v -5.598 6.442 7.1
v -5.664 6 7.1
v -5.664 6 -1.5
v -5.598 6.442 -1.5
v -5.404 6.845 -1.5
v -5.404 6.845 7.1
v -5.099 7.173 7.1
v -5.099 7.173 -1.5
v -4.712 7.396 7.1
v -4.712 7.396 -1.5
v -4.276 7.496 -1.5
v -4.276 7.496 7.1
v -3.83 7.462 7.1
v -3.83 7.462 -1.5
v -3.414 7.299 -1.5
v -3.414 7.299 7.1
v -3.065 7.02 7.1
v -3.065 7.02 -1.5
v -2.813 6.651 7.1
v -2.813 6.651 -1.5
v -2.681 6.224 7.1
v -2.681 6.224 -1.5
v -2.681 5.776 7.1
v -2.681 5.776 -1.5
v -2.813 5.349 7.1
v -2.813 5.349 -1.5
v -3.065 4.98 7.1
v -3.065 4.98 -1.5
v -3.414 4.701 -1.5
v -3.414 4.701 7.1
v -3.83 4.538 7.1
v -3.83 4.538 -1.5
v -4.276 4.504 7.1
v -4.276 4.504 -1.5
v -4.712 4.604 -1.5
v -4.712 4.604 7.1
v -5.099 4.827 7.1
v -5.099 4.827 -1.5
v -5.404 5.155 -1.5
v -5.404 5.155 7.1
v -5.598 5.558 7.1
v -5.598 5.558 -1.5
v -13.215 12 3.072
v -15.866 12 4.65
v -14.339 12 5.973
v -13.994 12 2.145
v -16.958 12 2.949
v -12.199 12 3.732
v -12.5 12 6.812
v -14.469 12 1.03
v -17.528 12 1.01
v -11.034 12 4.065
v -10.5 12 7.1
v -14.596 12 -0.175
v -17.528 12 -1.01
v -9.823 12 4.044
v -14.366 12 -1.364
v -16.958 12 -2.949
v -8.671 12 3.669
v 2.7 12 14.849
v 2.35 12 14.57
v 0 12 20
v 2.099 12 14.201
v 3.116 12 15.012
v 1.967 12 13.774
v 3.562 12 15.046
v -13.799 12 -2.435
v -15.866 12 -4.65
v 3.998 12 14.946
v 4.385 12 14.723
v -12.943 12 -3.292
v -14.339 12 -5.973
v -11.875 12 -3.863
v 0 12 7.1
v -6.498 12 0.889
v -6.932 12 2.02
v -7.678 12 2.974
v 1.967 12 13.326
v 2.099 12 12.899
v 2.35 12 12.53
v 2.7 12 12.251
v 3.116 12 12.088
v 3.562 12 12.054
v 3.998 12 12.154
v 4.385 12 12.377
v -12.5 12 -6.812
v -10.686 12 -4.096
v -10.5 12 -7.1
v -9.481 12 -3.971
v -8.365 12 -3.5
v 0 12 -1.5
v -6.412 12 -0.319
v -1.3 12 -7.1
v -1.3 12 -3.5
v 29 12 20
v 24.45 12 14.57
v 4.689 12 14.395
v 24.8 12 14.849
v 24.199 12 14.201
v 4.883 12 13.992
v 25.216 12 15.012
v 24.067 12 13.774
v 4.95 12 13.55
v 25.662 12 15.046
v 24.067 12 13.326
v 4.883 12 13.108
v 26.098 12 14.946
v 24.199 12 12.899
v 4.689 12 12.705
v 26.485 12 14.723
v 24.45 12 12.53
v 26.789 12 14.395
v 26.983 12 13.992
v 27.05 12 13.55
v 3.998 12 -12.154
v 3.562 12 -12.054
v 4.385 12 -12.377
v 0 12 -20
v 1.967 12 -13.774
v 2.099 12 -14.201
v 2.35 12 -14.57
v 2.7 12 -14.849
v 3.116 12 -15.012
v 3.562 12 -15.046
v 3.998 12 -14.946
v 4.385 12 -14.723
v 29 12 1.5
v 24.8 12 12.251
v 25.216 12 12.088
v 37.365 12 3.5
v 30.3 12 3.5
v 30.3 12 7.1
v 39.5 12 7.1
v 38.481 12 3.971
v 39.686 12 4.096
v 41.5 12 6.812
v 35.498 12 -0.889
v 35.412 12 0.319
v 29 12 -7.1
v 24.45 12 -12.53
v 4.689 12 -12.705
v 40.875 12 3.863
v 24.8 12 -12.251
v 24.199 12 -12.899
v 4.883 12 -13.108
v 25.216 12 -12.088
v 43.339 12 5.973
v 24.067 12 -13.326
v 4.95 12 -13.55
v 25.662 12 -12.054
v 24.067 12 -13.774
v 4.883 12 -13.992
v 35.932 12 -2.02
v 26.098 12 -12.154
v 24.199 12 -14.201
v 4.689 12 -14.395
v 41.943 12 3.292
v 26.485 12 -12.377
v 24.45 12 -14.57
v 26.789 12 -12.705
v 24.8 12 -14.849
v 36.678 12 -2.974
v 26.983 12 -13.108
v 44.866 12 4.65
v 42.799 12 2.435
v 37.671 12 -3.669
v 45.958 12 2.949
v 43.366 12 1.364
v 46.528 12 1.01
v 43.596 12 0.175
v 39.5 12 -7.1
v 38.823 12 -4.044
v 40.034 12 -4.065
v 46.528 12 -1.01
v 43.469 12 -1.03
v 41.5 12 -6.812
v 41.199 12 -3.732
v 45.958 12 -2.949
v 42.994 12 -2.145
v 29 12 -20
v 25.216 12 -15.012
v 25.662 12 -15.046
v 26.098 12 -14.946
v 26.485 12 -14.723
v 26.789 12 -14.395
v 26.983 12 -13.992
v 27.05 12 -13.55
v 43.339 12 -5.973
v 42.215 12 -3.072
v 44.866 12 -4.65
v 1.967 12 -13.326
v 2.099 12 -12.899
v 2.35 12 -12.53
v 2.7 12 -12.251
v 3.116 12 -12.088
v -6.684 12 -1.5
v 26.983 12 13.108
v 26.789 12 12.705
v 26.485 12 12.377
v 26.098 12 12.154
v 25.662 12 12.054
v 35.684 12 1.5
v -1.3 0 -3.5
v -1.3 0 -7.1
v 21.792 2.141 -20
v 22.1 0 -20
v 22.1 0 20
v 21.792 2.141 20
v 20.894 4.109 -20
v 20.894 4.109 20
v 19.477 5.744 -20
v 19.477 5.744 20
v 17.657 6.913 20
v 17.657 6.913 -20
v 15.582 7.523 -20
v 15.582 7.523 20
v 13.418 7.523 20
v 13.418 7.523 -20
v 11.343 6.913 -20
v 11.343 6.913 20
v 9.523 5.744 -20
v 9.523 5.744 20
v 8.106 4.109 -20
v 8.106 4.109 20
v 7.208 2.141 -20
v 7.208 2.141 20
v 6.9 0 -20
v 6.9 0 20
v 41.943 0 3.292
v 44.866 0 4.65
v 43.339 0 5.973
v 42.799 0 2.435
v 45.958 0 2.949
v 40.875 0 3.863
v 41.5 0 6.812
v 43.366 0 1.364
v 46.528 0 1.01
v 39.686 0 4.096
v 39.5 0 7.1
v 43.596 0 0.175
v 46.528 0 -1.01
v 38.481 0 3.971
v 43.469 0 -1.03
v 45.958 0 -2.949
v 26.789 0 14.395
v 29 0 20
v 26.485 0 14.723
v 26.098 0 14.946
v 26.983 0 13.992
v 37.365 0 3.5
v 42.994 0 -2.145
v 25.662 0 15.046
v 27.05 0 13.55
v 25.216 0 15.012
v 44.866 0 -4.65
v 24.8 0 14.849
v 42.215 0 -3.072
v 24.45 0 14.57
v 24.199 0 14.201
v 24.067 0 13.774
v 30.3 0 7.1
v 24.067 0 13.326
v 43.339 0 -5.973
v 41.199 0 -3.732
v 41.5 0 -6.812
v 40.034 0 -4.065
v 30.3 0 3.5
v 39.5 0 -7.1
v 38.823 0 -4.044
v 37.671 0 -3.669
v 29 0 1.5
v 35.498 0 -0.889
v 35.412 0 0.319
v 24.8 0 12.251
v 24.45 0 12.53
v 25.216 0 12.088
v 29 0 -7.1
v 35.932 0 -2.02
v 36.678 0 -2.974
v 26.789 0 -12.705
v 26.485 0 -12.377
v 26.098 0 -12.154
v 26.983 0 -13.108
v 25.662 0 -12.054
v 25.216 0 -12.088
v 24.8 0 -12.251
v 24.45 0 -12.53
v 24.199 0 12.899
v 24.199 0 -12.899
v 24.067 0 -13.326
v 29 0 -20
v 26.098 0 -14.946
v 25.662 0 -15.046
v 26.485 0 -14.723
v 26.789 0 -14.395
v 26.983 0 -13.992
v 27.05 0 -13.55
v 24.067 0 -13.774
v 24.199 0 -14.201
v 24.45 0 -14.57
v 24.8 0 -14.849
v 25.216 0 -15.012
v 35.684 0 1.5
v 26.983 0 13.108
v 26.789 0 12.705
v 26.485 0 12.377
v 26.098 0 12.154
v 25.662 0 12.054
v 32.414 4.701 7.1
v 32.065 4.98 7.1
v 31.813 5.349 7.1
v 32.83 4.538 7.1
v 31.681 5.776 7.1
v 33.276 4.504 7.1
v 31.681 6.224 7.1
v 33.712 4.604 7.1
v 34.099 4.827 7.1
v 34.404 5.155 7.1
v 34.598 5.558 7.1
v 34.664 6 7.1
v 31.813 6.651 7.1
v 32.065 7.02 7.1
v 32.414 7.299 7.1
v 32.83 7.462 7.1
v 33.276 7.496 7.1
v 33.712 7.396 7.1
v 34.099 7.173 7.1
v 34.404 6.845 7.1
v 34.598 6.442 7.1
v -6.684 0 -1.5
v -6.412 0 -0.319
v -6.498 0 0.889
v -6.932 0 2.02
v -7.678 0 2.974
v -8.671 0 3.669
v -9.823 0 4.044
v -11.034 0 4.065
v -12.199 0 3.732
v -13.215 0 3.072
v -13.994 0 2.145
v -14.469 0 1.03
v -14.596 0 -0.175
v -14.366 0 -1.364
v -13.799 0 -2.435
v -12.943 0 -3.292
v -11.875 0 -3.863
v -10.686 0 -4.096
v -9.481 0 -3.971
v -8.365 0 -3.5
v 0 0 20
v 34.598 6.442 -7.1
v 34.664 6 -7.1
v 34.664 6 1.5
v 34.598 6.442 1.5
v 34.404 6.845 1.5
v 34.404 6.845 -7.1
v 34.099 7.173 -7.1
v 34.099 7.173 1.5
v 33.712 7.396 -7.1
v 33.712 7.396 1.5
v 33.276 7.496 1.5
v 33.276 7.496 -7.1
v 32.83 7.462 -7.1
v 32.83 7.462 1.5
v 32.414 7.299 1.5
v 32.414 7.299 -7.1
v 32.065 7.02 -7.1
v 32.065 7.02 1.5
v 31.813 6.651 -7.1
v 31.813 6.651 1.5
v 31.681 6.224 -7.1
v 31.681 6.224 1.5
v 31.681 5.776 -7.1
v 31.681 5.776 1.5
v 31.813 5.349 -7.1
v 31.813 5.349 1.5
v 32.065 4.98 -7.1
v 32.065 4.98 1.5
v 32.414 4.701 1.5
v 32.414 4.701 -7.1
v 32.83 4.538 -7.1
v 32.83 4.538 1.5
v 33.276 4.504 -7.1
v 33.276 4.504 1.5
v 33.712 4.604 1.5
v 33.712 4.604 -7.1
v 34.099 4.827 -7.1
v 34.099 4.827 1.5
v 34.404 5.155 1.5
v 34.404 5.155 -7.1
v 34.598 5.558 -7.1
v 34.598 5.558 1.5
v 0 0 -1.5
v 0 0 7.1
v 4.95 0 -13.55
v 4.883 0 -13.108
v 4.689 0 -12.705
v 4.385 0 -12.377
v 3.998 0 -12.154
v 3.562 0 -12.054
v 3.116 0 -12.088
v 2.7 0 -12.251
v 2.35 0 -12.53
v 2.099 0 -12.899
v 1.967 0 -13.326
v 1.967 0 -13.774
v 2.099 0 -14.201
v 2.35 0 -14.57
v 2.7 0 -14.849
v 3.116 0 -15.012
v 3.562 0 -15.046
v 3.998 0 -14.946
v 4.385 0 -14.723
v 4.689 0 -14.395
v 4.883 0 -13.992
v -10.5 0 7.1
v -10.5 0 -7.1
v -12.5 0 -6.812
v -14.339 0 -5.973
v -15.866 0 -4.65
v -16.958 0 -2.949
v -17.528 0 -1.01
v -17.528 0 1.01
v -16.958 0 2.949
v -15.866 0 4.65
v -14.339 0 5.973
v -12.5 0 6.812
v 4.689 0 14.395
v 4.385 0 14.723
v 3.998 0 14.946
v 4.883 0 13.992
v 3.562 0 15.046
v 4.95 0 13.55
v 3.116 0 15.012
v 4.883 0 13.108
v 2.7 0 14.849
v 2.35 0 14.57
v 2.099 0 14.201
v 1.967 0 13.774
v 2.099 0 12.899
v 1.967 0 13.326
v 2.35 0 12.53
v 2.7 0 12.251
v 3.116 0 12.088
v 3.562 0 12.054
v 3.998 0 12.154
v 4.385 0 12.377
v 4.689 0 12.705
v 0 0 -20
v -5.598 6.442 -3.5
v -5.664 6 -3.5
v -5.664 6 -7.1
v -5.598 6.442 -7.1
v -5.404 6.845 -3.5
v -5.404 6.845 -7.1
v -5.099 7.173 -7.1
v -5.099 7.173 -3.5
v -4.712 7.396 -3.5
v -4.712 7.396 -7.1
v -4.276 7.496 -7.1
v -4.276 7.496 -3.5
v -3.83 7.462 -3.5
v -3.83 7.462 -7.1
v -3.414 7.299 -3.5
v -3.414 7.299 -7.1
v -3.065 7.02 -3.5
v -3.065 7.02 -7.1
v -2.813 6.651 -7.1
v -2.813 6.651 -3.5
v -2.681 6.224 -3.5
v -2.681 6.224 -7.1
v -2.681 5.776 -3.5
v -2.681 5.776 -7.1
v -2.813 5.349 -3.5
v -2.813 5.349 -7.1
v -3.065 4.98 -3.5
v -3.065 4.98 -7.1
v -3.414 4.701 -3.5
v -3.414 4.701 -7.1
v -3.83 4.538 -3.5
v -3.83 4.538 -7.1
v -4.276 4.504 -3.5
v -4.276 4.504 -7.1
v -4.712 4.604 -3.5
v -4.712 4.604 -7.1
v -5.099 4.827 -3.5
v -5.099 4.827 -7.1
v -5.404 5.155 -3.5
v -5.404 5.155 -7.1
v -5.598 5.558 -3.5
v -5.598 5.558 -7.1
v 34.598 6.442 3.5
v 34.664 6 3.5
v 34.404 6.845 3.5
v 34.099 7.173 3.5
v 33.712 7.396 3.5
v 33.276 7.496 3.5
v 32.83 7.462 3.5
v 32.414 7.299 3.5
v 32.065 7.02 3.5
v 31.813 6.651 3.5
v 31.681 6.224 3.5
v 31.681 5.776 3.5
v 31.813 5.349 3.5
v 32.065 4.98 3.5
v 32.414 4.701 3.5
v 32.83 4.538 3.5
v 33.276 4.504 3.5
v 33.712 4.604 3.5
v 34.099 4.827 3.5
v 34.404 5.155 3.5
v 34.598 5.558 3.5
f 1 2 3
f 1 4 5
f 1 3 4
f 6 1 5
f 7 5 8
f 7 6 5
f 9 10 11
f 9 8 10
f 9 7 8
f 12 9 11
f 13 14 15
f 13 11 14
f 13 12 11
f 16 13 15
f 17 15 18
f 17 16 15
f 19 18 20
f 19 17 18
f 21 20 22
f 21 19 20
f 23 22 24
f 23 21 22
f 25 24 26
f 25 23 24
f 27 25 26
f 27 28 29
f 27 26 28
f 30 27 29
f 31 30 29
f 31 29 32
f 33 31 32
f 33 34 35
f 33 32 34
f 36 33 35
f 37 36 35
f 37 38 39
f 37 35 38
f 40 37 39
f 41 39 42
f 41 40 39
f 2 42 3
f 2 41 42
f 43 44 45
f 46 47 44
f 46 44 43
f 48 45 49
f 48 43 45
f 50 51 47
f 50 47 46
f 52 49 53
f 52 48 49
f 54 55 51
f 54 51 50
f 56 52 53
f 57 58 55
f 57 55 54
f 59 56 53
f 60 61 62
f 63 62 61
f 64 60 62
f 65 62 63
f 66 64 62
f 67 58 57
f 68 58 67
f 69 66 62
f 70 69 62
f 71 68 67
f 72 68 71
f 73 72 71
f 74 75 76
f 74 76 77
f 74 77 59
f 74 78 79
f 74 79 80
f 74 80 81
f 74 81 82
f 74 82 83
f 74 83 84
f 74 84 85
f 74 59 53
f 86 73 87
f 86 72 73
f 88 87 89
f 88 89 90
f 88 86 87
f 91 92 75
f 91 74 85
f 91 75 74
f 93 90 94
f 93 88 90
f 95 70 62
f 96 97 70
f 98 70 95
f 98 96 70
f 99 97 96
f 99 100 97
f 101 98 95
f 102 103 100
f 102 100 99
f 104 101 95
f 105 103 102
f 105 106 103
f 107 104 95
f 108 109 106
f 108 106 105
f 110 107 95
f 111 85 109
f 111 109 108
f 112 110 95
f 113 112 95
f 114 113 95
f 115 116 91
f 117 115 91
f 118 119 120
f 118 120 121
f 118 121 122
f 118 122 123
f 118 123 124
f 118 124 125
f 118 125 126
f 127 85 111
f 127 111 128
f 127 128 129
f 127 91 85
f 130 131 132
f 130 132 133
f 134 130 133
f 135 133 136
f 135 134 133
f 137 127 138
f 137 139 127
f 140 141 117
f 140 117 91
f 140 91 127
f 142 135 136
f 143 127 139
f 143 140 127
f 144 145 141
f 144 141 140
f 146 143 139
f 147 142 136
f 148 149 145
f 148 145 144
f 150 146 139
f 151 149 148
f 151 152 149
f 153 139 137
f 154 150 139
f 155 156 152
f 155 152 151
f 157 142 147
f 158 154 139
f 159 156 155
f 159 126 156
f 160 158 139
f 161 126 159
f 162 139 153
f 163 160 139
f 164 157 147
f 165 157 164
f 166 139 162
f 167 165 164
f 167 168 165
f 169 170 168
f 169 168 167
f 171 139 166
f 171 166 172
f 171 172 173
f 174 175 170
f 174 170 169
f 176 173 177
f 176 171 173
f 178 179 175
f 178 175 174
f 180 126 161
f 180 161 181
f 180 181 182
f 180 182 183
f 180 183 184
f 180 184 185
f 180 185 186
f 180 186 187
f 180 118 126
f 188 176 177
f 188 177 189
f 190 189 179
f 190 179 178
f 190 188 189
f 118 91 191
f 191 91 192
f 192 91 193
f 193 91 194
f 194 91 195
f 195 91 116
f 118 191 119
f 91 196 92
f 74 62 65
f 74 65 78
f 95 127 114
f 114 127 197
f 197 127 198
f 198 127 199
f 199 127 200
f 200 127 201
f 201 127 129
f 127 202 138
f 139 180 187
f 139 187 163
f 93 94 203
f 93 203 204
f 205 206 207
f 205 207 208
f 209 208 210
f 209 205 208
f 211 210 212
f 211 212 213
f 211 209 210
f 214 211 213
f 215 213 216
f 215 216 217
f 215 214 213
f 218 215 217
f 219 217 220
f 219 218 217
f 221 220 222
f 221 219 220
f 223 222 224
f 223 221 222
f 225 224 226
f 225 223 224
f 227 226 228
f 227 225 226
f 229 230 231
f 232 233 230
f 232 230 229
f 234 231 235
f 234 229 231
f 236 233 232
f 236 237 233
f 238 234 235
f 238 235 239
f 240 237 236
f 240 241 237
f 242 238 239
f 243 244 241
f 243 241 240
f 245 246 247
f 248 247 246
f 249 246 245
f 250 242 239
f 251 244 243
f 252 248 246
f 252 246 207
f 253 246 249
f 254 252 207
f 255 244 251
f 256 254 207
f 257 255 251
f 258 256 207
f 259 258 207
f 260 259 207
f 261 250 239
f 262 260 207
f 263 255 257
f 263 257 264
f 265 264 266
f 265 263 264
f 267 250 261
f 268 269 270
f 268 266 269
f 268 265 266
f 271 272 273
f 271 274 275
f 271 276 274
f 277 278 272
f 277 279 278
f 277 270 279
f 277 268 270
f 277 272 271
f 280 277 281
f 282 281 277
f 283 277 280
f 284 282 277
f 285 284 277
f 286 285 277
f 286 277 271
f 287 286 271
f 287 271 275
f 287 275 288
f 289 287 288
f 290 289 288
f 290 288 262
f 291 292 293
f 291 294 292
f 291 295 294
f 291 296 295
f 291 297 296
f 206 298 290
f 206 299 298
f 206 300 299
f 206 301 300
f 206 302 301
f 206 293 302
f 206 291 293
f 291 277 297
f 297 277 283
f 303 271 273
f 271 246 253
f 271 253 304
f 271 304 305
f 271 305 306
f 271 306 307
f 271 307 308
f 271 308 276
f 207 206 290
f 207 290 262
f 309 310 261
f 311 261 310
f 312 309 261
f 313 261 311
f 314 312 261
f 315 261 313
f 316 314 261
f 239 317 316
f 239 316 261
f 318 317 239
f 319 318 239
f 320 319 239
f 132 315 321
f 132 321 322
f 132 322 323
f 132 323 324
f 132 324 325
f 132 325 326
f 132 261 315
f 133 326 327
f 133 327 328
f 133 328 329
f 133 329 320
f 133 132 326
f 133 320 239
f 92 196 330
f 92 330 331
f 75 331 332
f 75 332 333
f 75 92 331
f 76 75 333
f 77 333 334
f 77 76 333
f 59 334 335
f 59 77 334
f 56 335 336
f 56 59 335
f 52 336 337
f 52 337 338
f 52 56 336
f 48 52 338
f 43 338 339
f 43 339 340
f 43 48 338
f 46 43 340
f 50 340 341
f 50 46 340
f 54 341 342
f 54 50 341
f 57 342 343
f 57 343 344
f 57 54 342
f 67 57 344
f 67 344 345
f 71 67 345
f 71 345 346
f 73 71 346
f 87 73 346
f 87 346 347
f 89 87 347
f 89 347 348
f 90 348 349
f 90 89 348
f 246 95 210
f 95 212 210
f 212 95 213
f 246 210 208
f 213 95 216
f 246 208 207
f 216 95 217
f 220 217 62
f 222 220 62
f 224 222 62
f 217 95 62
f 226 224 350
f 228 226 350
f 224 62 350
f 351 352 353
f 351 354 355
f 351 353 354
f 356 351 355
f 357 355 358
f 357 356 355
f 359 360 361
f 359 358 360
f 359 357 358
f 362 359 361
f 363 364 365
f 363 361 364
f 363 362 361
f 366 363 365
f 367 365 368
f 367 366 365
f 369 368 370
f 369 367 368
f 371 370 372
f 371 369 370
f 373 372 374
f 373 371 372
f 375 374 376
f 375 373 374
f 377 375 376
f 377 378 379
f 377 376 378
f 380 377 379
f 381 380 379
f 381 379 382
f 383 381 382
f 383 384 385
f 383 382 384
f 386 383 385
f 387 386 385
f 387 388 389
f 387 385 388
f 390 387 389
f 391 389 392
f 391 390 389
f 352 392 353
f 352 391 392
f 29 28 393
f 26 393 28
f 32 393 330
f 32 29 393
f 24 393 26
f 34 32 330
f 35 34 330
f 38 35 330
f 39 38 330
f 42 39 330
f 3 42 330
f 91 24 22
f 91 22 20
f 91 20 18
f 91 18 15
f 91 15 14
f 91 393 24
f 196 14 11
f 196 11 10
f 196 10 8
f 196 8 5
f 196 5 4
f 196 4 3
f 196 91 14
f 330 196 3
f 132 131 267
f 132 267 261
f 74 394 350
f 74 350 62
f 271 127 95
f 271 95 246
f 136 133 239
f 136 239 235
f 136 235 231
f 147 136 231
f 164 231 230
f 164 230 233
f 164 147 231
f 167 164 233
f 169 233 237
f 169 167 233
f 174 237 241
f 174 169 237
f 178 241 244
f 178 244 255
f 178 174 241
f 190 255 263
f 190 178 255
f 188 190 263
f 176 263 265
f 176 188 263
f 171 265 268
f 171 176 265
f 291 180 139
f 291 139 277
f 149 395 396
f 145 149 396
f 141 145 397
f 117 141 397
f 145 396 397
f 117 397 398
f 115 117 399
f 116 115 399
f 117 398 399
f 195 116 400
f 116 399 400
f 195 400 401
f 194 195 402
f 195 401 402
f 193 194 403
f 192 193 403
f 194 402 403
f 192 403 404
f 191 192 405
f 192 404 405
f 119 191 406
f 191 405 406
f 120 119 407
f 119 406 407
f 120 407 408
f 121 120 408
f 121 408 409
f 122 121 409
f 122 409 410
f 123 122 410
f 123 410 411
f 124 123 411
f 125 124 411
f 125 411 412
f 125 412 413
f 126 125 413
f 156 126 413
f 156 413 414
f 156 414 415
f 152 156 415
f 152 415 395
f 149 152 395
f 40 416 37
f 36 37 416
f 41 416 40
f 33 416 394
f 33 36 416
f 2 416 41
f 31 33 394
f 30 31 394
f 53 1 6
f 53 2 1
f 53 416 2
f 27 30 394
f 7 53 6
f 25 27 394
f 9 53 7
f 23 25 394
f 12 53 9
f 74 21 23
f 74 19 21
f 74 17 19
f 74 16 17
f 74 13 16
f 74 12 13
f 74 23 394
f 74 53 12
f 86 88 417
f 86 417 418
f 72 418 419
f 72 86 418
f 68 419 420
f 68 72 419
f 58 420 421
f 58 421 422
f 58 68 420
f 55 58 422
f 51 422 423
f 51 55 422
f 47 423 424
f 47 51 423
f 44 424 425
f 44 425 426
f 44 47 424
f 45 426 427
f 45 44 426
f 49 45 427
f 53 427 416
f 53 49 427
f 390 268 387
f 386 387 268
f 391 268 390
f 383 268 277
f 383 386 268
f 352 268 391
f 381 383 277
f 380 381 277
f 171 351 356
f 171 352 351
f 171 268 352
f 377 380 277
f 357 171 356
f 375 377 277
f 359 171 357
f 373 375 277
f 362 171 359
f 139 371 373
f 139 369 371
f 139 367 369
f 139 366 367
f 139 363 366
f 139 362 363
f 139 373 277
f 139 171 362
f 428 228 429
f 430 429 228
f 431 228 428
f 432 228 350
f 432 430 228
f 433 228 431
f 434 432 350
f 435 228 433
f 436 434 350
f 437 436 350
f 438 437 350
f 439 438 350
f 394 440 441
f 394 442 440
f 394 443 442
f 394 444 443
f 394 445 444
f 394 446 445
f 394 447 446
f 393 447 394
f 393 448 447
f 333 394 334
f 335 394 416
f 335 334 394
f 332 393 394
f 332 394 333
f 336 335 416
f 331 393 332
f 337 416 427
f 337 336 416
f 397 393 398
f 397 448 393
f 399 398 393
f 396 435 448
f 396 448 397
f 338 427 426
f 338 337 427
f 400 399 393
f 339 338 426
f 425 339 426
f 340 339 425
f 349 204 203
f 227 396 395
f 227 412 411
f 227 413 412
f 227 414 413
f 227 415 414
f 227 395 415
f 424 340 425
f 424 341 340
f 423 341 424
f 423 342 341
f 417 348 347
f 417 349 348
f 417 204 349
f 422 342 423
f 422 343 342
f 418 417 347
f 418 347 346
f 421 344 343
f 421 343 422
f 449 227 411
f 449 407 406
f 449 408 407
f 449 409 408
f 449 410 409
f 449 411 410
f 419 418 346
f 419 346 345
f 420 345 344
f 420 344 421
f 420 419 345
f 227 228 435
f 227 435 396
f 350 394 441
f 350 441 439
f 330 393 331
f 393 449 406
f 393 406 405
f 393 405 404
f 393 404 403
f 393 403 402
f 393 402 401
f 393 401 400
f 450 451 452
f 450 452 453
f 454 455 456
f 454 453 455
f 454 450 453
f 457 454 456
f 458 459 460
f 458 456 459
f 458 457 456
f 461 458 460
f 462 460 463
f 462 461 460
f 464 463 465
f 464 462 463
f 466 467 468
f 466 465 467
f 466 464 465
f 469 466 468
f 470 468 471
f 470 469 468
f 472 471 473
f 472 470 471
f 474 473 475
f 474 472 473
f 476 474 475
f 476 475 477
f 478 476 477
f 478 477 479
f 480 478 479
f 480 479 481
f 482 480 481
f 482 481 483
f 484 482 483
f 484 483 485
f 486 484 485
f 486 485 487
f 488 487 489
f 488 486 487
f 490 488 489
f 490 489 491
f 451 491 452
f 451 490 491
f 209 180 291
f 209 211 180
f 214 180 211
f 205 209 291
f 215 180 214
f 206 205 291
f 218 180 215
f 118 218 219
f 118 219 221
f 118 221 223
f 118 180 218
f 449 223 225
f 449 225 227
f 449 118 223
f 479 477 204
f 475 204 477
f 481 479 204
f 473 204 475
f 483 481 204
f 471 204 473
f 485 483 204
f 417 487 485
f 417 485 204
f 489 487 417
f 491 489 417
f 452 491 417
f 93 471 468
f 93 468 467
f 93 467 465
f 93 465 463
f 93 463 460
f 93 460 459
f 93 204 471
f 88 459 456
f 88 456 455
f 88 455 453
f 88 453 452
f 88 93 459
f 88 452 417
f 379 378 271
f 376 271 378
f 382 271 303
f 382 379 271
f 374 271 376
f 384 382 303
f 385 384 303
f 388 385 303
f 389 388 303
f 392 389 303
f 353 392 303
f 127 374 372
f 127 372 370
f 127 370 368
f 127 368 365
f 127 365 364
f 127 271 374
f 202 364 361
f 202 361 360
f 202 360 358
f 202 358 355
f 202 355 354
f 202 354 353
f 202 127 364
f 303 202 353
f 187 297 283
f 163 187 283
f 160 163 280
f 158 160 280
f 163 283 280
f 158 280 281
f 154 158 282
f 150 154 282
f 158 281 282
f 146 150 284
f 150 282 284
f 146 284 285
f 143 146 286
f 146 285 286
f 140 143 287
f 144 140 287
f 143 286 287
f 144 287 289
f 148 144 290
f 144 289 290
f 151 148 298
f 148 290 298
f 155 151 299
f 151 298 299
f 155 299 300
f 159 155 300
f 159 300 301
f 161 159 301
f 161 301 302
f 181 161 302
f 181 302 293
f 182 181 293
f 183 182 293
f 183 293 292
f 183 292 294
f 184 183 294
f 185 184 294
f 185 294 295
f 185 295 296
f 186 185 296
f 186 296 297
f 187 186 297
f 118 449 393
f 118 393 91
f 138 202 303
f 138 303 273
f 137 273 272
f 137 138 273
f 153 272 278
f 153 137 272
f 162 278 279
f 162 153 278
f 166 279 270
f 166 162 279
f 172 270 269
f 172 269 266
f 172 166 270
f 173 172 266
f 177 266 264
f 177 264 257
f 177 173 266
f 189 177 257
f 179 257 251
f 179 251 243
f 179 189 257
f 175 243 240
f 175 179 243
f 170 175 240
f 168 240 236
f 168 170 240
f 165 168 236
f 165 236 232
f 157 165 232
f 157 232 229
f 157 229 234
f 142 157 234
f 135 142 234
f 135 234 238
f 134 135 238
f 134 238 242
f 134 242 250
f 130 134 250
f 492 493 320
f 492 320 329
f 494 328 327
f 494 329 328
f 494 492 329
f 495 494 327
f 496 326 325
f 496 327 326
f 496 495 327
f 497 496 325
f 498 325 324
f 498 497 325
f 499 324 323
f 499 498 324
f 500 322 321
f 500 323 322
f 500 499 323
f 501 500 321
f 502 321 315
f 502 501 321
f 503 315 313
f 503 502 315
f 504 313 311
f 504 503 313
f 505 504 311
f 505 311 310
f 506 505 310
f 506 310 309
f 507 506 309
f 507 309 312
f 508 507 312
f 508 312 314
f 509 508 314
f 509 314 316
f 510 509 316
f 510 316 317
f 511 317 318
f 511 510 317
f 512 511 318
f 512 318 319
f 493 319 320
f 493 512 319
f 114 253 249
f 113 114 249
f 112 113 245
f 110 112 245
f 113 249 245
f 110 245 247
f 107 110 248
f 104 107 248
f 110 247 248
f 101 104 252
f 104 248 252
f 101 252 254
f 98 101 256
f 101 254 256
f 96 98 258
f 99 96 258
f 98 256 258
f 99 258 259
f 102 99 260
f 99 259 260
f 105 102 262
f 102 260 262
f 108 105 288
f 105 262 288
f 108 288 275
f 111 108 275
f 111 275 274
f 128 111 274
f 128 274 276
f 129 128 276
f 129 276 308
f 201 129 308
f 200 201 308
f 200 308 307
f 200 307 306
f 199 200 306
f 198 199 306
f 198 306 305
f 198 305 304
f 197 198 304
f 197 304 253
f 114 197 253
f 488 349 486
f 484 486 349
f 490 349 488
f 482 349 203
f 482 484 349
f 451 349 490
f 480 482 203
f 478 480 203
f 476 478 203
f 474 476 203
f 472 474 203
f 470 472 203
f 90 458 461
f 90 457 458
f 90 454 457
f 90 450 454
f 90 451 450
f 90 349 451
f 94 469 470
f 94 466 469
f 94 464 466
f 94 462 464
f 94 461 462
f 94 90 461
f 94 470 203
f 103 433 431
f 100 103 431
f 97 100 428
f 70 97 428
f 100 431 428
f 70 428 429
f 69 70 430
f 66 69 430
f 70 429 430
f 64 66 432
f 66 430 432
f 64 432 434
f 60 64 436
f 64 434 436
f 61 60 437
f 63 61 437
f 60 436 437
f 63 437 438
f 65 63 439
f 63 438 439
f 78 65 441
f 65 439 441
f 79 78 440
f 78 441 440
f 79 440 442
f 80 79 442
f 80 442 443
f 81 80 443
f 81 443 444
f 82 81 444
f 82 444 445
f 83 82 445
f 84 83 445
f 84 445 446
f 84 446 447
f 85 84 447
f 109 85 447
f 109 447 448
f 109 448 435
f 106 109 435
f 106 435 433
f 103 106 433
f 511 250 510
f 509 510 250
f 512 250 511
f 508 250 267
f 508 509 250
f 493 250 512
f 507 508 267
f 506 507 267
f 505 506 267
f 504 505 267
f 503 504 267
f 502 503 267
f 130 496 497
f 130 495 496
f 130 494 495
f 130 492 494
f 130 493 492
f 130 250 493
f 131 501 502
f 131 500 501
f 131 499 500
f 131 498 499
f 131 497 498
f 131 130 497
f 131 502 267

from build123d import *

# Parameters (mm, degrees)
BOSS_EXTRUDE1_DEPTH      = 20
BOSS_EXTRUDE1_DEPTH_BACK = 20
BOSS_EXTRUDE2_DEPTH      = 12
CUT_EXTRUDE1_DEPTH       = 53.704933355
CUT_EXTRUDE1_DEPTH_BACK  = 53.704933355
CUT_EXTRUDE2_DEPTH       = 53.704933355
CUT_EXTRUDE2_DEPTH_BACK  = 53.704933355
SKETCH7_R                = 1.5
CUT_EXTRUDE3_DEPTH       = 53.1110353


with BuildPart() as part:
    # Sketch1 → Boss-Extrude1 (new, two sides: drawn at the far end of the back side and taken through both)
    with BuildSketch(Plane(origin=(0, 0, 0), x_dir=(0, 1, 0), z_dir=(0, 0, 1)).offset(-BOSS_EXTRUDE1_DEPTH_BACK)):
        with BuildLine():
            ThreePointArc((0, -22.1), (7.6, -14.5), (0, -6.9))
            Line((0, -6.9), (0, 0))
            Line((0, 0), (12, 0))
            Line((12, 0), (12, -29))
            Line((12, -29), (0, -29))
            Line((0, -29), (0, -22.1))
        make_face()
    extrude(amount=BOSS_EXTRUDE1_DEPTH + BOSS_EXTRUDE1_DEPTH_BACK)

    # Sketch3 → Boss-Extrude2 (add)
    with BuildSketch(Plane(origin=(0, 12, 0), x_dir=(-1, 0, 0), z_dir=(0, 1, 0))):
        with BuildLine():
            Line((1.3, -7.1), (10.5, -7.1))
            ThreePointArc((10.5, -7.1), (17.6, 0), (10.5, 7.1))
            Line((10.5, 7.1), (0, 7.1))
            Line((0, 7.1), (0, -1.5))
            Line((0, -1.5), (6.684243194, -1.5))
            ThreePointArc((6.684243194, -1.5), (13.639126216, 2.637401486), (8.36458435, -3.5))
            Line((8.36458435, -3.5), (1.3, -3.5))
            Line((1.3, -3.5), (1.3, -7.1))
        make_face()
        with BuildLine():
            Line((-39.5, -7.1), (-29, -7.1))
            Line((-29, -7.1), (-29, 1.5))
            Line((-29, 1.5), (-35.684243194, 1.5))
            ThreePointArc((-35.684243194, 1.5), (-42.639126216, -2.637401486), (-37.36458435, 3.5))
            Line((-37.36458435, 3.5), (-30.3, 3.5))
            Line((-30.3, 3.5), (-30.3, 7.1))
            Line((-30.3, 7.1), (-39.5, 7.1))
            ThreePointArc((-39.5, 7.1), (-46.6, 0), (-39.5, -7.1))
        make_face()
    extrude(amount=-BOSS_EXTRUDE2_DEPTH)

    # Sketch4 → Cut-Extrude1 (cut, two sides: drawn at the far end of the back side and taken through both)
    with BuildSketch(Plane(origin=(0, 0, -1.5), x_dir=(1, 0, 0), z_dir=(0, 0, -1)).offset(-CUT_EXTRUDE1_DEPTH_BACK)):
        with BuildLine():
            ThreePointArc((-2.664243194, -6), (-4.164243194, -4.5), (-5.664243194, -6))
            Line((-5.664243194, -6), (-2.664243194, -6))
        make_face()
        with BuildLine():
            Line((-2.664243194, -6), (-5.664243194, -6))
            ThreePointArc((-5.664243194, -6), (-4.164243194, -7.5), (-2.664243194, -6))
        make_face()
    extrude(amount=CUT_EXTRUDE1_DEPTH + CUT_EXTRUDE1_DEPTH_BACK, mode=Mode.SUBTRACT)

    # Sketch5 → Cut-Extrude2 (cut, two sides: drawn at the far end of the back side and taken through both)
    with BuildSketch(Plane.XY.offset(1.5).offset(-CUT_EXTRUDE2_DEPTH_BACK)):
        with BuildLine():
            ThreePointArc((31.664243194, 6), (33.164243194, 4.5), (34.664243194, 6))
            Line((34.664243194, 6), (31.664243194, 6))
        make_face()
        with BuildLine():
            Line((31.664243194, 6), (34.664243194, 6))
            ThreePointArc((34.664243194, 6), (33.164243194, 7.5), (31.664243194, 6))
        make_face()
    extrude(amount=CUT_EXTRUDE2_DEPTH + CUT_EXTRUDE2_DEPTH_BACK, mode=Mode.SUBTRACT)

    # Sketch7 → Cut-Extrude3 (cut, through all)
    with BuildSketch(Plane.XZ):
        with Locations((3.45, 13.55)):
            Circle(SKETCH7_R)
        with Locations((25.55, -13.55)):
            Circle(SKETCH7_R)
        with Locations((25.55, 13.55)):
            Circle(SKETCH7_R)
        with Locations((3.45, -13.55)):
            Circle(SKETCH7_R)
    extrude(amount=-CUT_EXTRUDE3_DEPTH, mode=Mode.SUBTRACT)


solid = part.part
